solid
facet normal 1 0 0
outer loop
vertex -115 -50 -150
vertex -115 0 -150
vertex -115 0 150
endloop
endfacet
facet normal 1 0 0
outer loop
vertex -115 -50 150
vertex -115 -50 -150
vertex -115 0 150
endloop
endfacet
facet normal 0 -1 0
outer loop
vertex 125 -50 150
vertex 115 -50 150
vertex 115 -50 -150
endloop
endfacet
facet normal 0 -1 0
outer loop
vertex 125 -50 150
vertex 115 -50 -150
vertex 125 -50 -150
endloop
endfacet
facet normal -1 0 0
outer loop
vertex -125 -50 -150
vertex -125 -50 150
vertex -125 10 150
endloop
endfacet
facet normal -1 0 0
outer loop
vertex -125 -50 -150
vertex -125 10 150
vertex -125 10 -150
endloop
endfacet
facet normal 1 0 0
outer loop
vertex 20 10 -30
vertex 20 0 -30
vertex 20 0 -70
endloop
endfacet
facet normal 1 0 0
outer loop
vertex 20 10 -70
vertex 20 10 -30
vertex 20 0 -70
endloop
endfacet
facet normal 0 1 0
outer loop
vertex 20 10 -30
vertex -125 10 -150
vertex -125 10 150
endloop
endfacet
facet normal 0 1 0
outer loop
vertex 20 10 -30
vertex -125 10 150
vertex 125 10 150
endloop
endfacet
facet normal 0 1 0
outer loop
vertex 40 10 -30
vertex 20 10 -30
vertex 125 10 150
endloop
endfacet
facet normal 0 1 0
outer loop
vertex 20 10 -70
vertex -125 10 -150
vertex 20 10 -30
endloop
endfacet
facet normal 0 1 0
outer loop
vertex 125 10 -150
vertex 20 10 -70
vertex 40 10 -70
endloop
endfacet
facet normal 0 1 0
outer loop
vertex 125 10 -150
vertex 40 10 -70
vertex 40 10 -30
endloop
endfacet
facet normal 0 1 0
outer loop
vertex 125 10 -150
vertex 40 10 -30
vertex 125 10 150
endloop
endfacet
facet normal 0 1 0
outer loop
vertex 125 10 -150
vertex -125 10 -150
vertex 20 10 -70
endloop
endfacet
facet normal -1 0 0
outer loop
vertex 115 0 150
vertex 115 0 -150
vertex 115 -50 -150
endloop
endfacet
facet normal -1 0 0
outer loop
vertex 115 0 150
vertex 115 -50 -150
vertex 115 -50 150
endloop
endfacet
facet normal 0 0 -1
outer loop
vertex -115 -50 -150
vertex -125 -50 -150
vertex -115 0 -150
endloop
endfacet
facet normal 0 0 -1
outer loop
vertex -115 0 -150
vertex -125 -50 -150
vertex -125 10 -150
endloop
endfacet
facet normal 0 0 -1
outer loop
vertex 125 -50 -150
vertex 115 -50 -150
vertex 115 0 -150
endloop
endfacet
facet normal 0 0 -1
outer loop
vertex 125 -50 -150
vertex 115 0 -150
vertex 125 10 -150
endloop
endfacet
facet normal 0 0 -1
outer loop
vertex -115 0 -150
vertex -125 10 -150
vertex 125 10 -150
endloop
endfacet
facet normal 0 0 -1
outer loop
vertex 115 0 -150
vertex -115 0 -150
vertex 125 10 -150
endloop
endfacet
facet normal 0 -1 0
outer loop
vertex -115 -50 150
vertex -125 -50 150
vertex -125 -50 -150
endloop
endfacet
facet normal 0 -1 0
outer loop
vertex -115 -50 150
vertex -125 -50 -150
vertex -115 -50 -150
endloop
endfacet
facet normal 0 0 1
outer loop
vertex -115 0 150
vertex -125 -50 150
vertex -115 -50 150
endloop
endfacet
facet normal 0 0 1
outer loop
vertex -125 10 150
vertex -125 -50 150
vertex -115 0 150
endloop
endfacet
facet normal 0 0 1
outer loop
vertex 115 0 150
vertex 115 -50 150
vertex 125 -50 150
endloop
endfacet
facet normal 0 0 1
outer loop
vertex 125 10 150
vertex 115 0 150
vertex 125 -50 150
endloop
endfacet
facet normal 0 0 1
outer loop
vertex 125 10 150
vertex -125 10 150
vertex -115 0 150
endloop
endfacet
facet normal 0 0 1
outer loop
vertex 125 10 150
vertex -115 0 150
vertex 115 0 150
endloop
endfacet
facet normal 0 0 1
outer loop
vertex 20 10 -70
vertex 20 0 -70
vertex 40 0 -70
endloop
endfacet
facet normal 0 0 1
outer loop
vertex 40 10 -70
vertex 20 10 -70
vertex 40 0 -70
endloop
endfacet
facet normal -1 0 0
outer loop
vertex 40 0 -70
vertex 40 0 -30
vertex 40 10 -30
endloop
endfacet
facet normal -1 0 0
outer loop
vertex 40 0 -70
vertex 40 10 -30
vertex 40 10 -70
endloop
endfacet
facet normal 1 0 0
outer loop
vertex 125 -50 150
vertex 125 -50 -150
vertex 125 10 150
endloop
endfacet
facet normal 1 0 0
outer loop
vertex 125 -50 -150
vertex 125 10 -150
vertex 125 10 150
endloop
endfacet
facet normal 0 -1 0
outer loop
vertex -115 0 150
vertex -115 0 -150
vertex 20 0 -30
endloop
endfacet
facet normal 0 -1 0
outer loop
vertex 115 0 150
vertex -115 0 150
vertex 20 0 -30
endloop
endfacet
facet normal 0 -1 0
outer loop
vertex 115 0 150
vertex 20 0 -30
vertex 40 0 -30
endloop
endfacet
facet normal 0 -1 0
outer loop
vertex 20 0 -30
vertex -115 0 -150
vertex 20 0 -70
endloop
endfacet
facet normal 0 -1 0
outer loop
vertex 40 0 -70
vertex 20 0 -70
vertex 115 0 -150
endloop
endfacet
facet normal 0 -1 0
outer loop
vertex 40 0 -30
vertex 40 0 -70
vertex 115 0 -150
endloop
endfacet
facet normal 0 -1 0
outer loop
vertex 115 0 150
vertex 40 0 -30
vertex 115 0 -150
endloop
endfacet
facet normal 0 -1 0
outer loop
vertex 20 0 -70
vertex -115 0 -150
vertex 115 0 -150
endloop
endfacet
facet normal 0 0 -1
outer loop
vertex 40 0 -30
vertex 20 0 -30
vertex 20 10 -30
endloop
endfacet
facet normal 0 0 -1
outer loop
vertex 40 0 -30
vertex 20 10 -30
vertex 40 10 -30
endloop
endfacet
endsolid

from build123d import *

# Parameters (mm, degrees)
SKETCH1_W           = 250
SKETCH1_H           = 300
SKETCH1_W_2         = 20
SKETCH1_H_2         = 40
BOSS_EXTRUDE1_DEPTH = 10
SKETCH2_W           = 10
SKETCH2_H           = 300
BOSS_EXTRUDE2_DEPTH = 50


with BuildPart() as part:
    # Sketch1 → Boss-Extrude1 (new body)
    with BuildSketch(Plane(origin=(0, 0, 0), x_dir=(1, 0, 0), z_dir=(0, 1, 0))):
        Rectangle(SKETCH1_W, SKETCH1_H)
        with Locations((30, 50)):
            Rectangle(SKETCH1_W_2, SKETCH1_H_2, mode=Mode.SUBTRACT)
    extrude(amount=BOSS_EXTRUDE1_DEPTH)

    # Sketch2 → Boss-Extrude2 (add)
    with BuildSketch(Plane.XZ):
        with Locations((120, 0)):
            Rectangle(SKETCH2_W, SKETCH2_H)
        with Locations((-120, 0)):
            Rectangle(SKETCH2_W, SKETCH2_H)
    extrude(amount=BOSS_EXTRUDE2_DEPTH)


solid = part.part
